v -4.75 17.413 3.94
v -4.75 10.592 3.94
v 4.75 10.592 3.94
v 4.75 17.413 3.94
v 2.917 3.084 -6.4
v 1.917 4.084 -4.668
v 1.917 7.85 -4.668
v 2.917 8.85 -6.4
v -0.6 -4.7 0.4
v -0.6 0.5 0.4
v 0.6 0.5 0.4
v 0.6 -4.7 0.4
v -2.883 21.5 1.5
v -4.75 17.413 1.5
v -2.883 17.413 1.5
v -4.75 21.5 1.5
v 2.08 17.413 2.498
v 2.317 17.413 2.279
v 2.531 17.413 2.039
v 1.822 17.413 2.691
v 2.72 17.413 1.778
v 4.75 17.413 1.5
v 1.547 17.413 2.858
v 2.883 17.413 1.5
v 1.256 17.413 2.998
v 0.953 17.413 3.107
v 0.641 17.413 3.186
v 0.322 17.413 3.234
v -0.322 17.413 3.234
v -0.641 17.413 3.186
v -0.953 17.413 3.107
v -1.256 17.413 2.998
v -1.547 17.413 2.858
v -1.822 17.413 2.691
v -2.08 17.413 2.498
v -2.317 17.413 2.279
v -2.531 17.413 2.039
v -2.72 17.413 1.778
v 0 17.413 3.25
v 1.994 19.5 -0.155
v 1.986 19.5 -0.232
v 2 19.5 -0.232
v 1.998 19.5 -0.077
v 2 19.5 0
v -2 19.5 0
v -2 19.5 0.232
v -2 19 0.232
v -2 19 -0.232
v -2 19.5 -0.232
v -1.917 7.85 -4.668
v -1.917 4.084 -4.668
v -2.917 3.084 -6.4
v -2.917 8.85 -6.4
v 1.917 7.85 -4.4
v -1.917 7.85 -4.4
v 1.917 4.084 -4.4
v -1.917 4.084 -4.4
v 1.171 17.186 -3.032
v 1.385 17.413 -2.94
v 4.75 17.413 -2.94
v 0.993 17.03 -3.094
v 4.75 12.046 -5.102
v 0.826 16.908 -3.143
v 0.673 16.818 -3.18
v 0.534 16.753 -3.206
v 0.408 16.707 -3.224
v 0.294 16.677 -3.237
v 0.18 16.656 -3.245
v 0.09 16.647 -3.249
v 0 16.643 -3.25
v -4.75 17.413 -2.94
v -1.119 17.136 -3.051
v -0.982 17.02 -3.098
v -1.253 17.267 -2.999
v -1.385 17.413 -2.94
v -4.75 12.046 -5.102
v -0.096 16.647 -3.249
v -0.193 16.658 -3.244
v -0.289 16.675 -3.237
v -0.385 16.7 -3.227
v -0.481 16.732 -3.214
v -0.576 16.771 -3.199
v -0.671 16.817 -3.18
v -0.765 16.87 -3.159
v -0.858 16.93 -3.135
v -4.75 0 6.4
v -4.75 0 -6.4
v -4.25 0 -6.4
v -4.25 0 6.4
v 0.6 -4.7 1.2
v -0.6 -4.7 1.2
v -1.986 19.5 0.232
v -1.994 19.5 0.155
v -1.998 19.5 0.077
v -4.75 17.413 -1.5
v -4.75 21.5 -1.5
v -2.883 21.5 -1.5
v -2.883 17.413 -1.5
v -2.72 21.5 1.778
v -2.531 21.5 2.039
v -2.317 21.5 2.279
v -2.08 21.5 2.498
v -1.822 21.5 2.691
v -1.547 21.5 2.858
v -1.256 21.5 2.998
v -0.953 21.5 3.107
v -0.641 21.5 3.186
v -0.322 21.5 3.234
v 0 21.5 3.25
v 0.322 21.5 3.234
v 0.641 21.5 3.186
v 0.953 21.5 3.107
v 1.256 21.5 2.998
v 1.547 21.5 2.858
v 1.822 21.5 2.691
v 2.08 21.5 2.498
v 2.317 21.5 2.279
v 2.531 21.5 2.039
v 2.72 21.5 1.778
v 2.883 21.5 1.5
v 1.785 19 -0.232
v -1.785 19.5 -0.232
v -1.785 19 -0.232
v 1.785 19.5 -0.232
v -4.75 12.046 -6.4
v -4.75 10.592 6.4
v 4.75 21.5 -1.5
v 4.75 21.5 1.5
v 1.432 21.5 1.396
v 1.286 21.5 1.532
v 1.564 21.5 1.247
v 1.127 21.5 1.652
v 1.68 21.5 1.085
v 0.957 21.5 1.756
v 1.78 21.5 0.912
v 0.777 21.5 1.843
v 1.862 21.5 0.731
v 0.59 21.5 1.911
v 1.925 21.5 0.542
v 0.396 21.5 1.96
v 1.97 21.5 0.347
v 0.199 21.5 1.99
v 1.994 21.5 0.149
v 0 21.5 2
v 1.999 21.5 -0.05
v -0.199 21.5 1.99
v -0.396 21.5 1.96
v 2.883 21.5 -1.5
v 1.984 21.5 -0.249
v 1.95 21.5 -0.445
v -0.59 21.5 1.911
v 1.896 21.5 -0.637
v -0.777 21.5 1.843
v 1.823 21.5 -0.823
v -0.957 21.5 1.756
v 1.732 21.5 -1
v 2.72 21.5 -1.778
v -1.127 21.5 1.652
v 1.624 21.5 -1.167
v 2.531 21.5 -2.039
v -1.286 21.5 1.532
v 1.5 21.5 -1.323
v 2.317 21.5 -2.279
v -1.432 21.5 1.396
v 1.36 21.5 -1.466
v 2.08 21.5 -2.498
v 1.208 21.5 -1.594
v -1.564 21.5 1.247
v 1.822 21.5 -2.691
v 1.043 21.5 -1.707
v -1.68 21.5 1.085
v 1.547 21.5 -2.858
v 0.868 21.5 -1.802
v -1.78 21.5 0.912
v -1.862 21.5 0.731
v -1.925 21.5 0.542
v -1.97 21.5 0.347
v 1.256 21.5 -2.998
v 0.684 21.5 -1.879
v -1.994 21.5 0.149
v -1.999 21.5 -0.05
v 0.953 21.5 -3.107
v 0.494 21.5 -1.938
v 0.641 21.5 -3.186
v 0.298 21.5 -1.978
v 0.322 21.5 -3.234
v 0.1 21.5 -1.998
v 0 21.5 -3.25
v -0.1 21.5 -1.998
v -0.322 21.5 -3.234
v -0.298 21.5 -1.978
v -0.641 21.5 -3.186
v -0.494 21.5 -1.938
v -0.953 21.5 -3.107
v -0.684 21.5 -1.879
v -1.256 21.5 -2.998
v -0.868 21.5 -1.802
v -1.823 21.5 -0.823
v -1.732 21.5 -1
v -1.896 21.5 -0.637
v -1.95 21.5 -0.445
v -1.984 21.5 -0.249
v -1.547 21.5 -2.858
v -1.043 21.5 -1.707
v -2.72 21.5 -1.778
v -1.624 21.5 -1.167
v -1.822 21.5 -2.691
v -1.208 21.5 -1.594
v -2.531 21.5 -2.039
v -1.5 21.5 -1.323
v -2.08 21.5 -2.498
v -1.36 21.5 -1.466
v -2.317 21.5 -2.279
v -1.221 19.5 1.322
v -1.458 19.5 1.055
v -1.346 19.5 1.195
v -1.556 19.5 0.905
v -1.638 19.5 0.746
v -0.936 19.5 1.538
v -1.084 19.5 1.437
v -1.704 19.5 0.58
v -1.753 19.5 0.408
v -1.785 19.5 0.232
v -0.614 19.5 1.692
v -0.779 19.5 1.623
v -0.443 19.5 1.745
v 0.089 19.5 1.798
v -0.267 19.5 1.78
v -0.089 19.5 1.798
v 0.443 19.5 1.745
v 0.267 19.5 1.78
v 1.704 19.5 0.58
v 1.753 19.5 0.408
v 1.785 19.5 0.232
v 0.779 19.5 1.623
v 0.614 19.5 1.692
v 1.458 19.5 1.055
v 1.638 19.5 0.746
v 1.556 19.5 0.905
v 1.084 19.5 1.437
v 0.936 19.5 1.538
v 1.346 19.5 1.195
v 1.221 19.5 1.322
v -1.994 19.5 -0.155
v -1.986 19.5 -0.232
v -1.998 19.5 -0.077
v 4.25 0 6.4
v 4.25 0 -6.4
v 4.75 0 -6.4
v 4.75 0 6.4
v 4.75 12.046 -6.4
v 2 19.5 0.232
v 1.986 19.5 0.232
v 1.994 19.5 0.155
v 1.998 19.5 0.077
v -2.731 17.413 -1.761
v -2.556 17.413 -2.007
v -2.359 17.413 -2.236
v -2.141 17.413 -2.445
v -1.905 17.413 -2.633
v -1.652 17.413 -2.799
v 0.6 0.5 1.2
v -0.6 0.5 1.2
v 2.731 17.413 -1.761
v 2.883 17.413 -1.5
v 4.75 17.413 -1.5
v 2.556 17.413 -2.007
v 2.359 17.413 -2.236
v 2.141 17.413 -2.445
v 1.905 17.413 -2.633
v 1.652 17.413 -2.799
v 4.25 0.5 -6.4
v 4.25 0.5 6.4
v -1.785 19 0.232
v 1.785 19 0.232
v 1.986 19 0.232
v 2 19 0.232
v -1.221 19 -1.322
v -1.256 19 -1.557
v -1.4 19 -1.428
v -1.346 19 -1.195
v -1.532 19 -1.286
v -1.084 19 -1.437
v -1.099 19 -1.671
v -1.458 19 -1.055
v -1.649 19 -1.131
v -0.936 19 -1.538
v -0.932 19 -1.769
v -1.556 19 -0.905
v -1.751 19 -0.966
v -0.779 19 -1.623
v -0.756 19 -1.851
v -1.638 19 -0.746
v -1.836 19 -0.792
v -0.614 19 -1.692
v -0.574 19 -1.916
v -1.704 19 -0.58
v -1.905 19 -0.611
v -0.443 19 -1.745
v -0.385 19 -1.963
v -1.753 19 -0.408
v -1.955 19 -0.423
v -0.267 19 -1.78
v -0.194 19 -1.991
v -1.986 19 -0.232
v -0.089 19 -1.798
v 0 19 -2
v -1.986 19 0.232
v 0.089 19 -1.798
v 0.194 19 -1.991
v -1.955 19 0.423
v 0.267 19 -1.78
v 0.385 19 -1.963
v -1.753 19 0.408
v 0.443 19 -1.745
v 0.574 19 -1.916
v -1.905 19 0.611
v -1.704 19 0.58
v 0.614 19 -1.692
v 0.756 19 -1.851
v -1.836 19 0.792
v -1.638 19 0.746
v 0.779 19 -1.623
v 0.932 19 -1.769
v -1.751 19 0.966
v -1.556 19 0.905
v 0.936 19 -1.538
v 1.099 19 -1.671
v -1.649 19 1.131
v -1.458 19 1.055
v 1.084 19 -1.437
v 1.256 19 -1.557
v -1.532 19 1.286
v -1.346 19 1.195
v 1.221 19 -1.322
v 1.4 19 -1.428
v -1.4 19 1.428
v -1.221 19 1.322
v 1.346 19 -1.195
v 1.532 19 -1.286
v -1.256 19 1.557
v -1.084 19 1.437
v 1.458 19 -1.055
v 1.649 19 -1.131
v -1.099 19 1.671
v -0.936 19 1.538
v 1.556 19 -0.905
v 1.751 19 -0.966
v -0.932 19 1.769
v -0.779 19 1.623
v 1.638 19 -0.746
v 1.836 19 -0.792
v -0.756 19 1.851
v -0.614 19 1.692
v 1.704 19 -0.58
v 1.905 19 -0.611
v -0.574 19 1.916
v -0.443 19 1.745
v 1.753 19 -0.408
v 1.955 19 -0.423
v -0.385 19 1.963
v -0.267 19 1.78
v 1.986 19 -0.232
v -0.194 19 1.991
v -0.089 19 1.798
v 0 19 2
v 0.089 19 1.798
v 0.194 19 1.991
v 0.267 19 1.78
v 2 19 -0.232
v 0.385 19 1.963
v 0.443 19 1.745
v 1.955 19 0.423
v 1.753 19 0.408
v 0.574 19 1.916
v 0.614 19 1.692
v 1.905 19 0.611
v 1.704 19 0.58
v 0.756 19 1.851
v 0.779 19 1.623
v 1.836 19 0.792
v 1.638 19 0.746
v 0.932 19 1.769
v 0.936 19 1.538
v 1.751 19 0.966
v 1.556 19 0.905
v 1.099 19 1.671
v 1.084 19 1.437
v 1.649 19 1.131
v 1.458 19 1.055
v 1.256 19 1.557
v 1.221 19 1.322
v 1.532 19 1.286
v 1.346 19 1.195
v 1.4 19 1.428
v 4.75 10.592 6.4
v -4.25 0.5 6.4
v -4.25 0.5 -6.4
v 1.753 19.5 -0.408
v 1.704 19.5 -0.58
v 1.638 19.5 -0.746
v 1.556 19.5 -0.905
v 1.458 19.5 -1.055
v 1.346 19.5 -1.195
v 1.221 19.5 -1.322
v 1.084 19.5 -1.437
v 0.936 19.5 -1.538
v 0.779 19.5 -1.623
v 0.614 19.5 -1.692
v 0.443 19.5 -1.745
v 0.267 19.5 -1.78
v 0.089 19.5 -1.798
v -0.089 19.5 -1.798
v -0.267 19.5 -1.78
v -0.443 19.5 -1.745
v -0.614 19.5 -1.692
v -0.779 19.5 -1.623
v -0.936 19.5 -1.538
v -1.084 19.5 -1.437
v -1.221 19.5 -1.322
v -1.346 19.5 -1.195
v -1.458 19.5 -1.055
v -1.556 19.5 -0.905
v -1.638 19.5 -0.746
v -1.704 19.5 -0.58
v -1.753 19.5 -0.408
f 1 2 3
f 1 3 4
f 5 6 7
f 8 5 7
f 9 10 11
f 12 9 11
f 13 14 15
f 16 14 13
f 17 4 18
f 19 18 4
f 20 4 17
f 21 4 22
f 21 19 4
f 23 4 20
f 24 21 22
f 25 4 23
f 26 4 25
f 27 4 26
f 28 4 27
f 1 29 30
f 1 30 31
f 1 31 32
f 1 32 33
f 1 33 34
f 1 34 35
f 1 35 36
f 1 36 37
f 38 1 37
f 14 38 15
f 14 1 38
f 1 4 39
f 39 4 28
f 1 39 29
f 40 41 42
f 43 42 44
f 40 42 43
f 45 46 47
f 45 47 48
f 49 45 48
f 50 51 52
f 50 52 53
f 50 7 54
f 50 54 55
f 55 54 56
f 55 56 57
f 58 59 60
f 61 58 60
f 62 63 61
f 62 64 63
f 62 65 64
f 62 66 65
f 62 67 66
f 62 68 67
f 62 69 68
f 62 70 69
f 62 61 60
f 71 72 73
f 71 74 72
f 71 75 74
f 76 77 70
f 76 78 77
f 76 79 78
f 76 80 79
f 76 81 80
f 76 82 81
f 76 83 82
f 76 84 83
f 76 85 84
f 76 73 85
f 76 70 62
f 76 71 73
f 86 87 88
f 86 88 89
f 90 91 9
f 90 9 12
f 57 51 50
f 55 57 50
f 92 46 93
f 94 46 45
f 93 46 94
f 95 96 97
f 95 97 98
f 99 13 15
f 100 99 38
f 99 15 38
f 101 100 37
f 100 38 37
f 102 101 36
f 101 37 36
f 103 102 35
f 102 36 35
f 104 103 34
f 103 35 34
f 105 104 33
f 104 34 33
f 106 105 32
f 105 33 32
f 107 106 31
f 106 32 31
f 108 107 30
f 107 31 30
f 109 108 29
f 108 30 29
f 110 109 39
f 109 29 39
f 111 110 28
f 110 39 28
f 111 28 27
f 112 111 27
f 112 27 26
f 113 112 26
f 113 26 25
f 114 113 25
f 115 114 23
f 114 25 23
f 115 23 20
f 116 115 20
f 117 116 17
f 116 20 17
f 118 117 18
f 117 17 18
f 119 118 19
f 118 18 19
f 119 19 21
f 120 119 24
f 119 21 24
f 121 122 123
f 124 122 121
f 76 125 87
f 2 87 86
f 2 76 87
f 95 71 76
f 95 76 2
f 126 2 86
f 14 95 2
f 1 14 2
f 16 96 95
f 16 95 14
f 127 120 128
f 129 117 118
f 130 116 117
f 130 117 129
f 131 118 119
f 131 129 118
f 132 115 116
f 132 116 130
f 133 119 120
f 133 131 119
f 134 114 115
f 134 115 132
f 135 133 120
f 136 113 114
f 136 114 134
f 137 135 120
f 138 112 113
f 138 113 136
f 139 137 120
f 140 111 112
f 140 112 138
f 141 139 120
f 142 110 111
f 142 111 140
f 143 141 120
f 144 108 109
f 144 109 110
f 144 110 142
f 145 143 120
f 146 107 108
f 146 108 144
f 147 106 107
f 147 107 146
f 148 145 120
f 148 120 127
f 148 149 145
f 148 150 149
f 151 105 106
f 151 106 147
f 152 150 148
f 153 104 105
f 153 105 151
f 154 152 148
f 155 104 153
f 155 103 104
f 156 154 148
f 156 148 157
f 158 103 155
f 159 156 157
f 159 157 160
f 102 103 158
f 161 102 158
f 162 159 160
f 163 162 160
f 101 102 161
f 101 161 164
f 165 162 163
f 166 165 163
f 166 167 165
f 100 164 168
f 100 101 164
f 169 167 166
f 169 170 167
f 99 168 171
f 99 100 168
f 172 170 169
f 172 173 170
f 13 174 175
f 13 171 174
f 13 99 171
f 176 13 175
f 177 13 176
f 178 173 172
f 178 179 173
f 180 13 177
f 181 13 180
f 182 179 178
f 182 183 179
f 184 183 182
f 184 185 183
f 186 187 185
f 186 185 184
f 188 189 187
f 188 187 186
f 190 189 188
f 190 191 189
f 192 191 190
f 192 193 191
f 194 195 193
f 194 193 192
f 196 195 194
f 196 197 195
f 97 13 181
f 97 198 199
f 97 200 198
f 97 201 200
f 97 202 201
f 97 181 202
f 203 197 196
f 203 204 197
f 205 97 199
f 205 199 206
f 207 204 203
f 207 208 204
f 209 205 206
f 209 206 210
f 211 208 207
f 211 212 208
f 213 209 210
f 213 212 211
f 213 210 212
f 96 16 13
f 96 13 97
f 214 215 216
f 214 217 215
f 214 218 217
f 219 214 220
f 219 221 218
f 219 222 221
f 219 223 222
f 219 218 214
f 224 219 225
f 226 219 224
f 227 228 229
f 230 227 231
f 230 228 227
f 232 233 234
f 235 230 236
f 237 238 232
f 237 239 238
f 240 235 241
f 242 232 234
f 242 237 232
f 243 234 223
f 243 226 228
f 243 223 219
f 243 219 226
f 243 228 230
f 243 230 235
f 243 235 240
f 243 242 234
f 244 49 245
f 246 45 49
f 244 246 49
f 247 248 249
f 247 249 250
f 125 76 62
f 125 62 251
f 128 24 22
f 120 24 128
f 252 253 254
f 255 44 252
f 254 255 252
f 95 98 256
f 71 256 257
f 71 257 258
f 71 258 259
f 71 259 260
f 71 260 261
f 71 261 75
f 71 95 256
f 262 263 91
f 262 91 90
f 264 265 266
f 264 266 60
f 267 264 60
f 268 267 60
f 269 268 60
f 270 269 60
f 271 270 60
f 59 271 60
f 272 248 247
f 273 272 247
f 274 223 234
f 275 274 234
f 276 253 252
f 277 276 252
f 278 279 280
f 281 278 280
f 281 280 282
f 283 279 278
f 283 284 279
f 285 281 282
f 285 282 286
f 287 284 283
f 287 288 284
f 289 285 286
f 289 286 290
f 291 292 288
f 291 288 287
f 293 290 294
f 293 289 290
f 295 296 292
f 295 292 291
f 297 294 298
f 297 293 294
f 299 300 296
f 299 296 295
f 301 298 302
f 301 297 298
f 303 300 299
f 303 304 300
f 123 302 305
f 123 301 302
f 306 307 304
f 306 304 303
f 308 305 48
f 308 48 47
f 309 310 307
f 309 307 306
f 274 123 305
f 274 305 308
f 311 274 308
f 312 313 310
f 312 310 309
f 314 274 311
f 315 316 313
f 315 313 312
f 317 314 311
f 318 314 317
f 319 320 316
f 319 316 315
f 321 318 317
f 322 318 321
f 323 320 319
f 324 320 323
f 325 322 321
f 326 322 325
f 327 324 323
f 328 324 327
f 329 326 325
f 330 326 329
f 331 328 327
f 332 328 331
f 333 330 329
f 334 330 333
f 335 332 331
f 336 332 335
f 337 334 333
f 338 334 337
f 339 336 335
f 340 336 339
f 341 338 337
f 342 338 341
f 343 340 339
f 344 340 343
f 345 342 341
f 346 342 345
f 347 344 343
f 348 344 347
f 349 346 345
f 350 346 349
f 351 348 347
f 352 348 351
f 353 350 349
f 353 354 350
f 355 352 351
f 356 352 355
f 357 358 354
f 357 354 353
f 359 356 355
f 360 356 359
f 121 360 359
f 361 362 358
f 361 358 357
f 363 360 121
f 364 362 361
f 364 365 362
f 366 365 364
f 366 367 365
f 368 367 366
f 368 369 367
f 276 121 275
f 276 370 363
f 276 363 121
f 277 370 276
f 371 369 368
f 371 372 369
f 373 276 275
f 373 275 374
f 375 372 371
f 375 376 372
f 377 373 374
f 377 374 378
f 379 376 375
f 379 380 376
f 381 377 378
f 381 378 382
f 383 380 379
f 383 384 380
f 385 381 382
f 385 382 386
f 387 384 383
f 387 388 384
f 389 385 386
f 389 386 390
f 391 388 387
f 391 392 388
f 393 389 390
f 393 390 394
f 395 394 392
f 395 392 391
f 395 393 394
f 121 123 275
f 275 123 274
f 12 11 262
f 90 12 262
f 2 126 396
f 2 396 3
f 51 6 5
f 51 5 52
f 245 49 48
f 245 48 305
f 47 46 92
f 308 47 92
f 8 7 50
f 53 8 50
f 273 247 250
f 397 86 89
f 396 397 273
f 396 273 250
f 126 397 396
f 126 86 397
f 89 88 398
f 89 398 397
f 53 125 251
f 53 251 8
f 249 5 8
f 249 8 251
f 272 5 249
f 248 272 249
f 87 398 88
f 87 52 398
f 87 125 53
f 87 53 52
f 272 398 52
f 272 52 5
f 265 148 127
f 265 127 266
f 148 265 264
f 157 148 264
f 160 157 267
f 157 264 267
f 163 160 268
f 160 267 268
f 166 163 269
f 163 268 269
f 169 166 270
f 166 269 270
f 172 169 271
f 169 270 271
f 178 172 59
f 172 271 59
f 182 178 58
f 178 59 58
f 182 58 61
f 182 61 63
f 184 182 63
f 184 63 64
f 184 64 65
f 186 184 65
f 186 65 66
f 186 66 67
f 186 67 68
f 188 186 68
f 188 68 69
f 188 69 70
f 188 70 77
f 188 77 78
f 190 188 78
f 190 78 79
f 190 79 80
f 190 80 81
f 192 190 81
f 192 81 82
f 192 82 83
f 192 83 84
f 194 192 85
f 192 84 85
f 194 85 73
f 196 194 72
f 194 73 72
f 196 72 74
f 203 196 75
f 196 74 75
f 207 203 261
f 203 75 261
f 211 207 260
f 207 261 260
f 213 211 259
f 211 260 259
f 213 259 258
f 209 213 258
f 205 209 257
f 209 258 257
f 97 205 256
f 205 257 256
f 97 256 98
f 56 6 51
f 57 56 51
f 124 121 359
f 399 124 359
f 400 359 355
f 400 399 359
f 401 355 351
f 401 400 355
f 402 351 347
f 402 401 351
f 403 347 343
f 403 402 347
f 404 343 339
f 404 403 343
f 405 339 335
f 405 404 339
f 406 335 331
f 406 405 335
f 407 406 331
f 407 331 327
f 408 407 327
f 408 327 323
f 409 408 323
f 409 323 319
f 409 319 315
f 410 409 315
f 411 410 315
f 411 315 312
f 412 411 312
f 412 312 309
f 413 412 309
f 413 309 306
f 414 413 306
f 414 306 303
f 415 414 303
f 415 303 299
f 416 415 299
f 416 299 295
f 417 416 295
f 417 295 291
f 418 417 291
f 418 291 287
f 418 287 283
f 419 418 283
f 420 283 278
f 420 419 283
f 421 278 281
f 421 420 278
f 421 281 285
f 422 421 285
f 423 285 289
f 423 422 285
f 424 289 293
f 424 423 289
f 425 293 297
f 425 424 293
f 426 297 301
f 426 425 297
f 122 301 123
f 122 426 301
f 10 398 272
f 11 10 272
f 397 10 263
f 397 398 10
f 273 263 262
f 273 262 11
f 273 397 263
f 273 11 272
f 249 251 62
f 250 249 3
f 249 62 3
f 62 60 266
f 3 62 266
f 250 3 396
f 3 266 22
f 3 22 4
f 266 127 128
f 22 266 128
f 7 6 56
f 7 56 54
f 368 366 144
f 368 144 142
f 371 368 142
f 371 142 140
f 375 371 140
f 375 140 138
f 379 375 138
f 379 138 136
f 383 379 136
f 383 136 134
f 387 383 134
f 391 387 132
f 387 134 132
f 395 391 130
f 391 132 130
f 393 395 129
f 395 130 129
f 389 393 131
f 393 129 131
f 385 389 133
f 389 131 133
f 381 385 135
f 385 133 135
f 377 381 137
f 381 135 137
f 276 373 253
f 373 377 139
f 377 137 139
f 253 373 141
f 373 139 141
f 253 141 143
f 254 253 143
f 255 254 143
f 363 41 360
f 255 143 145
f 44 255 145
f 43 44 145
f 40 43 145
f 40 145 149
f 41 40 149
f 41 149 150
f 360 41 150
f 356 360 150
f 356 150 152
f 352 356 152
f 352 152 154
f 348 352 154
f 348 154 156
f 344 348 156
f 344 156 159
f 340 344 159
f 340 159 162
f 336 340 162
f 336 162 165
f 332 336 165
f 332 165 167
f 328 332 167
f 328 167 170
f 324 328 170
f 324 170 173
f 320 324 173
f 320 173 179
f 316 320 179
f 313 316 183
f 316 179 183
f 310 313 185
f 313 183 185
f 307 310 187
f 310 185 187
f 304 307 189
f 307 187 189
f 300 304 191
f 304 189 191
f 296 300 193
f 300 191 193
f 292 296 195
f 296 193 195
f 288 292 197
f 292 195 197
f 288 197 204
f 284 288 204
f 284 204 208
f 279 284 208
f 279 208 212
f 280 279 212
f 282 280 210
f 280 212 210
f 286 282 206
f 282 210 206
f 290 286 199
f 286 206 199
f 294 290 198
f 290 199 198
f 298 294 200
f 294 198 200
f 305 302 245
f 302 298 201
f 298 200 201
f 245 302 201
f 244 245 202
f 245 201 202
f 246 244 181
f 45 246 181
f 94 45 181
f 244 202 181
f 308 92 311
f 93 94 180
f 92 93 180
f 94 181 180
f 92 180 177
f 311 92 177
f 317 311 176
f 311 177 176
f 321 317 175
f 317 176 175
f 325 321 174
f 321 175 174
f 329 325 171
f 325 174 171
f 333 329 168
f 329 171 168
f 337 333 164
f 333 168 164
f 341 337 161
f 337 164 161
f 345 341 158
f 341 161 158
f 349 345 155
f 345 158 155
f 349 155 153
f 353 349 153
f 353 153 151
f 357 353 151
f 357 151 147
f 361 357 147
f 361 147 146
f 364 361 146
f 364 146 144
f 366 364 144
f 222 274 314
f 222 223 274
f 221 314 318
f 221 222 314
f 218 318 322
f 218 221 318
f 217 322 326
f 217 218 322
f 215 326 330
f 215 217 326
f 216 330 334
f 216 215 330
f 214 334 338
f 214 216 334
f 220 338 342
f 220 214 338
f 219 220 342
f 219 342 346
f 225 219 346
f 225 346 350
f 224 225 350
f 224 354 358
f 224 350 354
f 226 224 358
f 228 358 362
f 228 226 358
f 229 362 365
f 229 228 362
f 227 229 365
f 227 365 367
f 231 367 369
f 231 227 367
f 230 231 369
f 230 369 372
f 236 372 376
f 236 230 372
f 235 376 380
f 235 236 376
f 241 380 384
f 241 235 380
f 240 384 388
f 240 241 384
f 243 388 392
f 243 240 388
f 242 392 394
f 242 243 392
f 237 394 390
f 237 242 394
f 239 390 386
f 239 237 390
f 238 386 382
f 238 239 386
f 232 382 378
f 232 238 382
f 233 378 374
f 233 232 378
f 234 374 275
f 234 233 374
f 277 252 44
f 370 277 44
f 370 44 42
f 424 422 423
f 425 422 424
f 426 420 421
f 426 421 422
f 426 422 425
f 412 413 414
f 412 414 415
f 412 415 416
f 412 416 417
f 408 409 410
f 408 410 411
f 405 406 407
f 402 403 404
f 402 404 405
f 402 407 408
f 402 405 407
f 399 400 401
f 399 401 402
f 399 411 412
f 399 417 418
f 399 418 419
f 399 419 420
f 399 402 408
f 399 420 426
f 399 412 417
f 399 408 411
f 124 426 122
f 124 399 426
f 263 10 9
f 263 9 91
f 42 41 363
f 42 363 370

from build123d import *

# Parameters (mm, degrees)
EXTRUDE_1_DEPTH      = 4.75
EXTRUDE_1_DEPTH_BACK = 4.75
EXTRUDE_START        = -4.856555
SKETCH_3_R           = 3.25
EXTRUDE_2_DEPTH      = 4.856555
SKETCH_4_R           = 2
CUT_EXTRUDE_1_DEPTH  = 2
SKETCH_7_R           = 2
SKETCH_7_R_2         = 1.8
CUT_EXTRUDE_5_DEPTH  = 0.5
SKETCH_5_W           = 4
SKETCH_5_H           = 0.464054996
CUT_EXTRUDE_2_DEPTH  = 0.5
SKETCH_8_W           = 3.834533928
SKETCH_8_H           = 3.766589268
CUT_EXTRUDE_6_DEPTH  = 2
CHAMFER_1_SIZE       = 1
CHAMFER_1_SIZE2      = 1.732050808
SKETCH_9_W           = 8.5
SKETCH_9_H           = 12.8
CUT_EXTRUDE_7_DEPTH  = 0.5
SKETCH_10_W          = 1.2
SKETCH_10_H          = 0.8
EXTRUDE_4_DEPTH      = 5.2


with BuildPart() as part:
    # 草图2 → 凸台-拉伸1 (new, two sides: drawn at the far end of the back side and taken through both)
    with BuildSketch(Plane(origin=(0, 0, 0), x_dir=(0, 0, -1), z_dir=(1, 0, 0)).offset(-EXTRUDE_1_DEPTH_BACK)):
        Polygon((6.4, 0), (-6.4, 0), (-6.4, 10.591546325), (-3.93965691, 10.591546325), (-3.93965691, 17.413010672), (-1.5, 17.413010672), (-1.5, 21.5), (1.5, 21.5), (1.5, 17.413010672), (2.939959322, 17.413010672), (5.102008026, 12.046496925), (6.4, 12.046496925), align=None)
    extrude(amount=EXTRUDE_1_DEPTH + EXTRUDE_1_DEPTH_BACK)

    # 草图3 → 凸台-拉伸2 (add)
    with BuildSketch(Plane(origin=(0, 21.5, 0), x_dir=(1, 0, 0), z_dir=(0, 1, 0)).offset(EXTRUDE_START)):
        Circle(SKETCH_3_R)
    extrude(amount=EXTRUDE_2_DEPTH)

    # 草图4 → 切除-拉伸1 (cut)
    with BuildSketch(Plane(origin=(0, 21.5, 0), x_dir=(1, 0, 0), z_dir=(0, 1, 0))):
        with Locations(Location((0, 0, 0), (0, 0, 270))):
            Circle(SKETCH_4_R)
    extrude(amount=-CUT_EXTRUDE_1_DEPTH, mode=Mode.SUBTRACT)

    # 草图7 → 切除-拉伸5 (cut)
    with BuildSketch(Plane(origin=(0, 19.5, 0), x_dir=(1, 0, 0), z_dir=(0, 1, 0))):
        with Locations(Location((0, 0, 0), (0, 0, 270))):
            Circle(SKETCH_7_R)
        with Locations(Location((0, 0, 0), (0, 0, 270))):
            Circle(SKETCH_7_R_2, mode=Mode.SUBTRACT)
    extrude(amount=-CUT_EXTRUDE_5_DEPTH, mode=Mode.SUBTRACT)

    # 草图5 → 切除-拉伸2 (cut)
    with BuildSketch(Plane(origin=(0, 19.5, 0), x_dir=(1, 0, 0), z_dir=(0, 1, 0))):
        Rectangle(SKETCH_5_W, SKETCH_5_H)
    extrude(amount=-CUT_EXTRUDE_2_DEPTH, mode=Mode.SUBTRACT)

    # 草图8 → 切除-拉伸6 (cut)
    with BuildSketch(Plane(origin=(0, 0, -6.4), x_dir=(-1, 0, 0), z_dir=(0, 0, -1))):
        with Locations((0, 5.966845297)):
            Rectangle(SKETCH_8_W, SKETCH_8_H)
    extrude(amount=-CUT_EXTRUDE_6_DEPTH, mode=Mode.SUBTRACT)

    # 倒角1
    chamfer_1_edges = [part.edges().sort_by_distance(p)[0] for p in [
        (1.917266964, 5.966845297, -6.4),
        (0, 4.083550663, -6.4),
        (-1.917266964, 5.966845297, -6.4),
        (0, 7.850139931, -6.4),
    ]]
    chamfer_1_side = [part.faces().sort_by_distance(p)[0] for p in [
        (4.596582893, 6.023248462, -6.4),
    ]]
    chamfer(chamfer_1_edges, length=CHAMFER_1_SIZE, length2=CHAMFER_1_SIZE2, reference=chamfer_1_side[0])

    # 草图9 → 切除-拉伸7 (cut)
    with BuildSketch(Plane.XZ):
        Rectangle(SKETCH_9_W, SKETCH_9_H)
    extrude(amount=-CUT_EXTRUDE_7_DEPTH, mode=Mode.SUBTRACT)

    # 草图10 → 凸台-拉伸4 (add)
    with BuildSketch(Plane.XZ.offset(-0.5)):
        with Locations((0, 0.8)):
            Rectangle(SKETCH_10_W, SKETCH_10_H)
    extrude(amount=EXTRUDE_4_DEPTH)


solid = part.part
